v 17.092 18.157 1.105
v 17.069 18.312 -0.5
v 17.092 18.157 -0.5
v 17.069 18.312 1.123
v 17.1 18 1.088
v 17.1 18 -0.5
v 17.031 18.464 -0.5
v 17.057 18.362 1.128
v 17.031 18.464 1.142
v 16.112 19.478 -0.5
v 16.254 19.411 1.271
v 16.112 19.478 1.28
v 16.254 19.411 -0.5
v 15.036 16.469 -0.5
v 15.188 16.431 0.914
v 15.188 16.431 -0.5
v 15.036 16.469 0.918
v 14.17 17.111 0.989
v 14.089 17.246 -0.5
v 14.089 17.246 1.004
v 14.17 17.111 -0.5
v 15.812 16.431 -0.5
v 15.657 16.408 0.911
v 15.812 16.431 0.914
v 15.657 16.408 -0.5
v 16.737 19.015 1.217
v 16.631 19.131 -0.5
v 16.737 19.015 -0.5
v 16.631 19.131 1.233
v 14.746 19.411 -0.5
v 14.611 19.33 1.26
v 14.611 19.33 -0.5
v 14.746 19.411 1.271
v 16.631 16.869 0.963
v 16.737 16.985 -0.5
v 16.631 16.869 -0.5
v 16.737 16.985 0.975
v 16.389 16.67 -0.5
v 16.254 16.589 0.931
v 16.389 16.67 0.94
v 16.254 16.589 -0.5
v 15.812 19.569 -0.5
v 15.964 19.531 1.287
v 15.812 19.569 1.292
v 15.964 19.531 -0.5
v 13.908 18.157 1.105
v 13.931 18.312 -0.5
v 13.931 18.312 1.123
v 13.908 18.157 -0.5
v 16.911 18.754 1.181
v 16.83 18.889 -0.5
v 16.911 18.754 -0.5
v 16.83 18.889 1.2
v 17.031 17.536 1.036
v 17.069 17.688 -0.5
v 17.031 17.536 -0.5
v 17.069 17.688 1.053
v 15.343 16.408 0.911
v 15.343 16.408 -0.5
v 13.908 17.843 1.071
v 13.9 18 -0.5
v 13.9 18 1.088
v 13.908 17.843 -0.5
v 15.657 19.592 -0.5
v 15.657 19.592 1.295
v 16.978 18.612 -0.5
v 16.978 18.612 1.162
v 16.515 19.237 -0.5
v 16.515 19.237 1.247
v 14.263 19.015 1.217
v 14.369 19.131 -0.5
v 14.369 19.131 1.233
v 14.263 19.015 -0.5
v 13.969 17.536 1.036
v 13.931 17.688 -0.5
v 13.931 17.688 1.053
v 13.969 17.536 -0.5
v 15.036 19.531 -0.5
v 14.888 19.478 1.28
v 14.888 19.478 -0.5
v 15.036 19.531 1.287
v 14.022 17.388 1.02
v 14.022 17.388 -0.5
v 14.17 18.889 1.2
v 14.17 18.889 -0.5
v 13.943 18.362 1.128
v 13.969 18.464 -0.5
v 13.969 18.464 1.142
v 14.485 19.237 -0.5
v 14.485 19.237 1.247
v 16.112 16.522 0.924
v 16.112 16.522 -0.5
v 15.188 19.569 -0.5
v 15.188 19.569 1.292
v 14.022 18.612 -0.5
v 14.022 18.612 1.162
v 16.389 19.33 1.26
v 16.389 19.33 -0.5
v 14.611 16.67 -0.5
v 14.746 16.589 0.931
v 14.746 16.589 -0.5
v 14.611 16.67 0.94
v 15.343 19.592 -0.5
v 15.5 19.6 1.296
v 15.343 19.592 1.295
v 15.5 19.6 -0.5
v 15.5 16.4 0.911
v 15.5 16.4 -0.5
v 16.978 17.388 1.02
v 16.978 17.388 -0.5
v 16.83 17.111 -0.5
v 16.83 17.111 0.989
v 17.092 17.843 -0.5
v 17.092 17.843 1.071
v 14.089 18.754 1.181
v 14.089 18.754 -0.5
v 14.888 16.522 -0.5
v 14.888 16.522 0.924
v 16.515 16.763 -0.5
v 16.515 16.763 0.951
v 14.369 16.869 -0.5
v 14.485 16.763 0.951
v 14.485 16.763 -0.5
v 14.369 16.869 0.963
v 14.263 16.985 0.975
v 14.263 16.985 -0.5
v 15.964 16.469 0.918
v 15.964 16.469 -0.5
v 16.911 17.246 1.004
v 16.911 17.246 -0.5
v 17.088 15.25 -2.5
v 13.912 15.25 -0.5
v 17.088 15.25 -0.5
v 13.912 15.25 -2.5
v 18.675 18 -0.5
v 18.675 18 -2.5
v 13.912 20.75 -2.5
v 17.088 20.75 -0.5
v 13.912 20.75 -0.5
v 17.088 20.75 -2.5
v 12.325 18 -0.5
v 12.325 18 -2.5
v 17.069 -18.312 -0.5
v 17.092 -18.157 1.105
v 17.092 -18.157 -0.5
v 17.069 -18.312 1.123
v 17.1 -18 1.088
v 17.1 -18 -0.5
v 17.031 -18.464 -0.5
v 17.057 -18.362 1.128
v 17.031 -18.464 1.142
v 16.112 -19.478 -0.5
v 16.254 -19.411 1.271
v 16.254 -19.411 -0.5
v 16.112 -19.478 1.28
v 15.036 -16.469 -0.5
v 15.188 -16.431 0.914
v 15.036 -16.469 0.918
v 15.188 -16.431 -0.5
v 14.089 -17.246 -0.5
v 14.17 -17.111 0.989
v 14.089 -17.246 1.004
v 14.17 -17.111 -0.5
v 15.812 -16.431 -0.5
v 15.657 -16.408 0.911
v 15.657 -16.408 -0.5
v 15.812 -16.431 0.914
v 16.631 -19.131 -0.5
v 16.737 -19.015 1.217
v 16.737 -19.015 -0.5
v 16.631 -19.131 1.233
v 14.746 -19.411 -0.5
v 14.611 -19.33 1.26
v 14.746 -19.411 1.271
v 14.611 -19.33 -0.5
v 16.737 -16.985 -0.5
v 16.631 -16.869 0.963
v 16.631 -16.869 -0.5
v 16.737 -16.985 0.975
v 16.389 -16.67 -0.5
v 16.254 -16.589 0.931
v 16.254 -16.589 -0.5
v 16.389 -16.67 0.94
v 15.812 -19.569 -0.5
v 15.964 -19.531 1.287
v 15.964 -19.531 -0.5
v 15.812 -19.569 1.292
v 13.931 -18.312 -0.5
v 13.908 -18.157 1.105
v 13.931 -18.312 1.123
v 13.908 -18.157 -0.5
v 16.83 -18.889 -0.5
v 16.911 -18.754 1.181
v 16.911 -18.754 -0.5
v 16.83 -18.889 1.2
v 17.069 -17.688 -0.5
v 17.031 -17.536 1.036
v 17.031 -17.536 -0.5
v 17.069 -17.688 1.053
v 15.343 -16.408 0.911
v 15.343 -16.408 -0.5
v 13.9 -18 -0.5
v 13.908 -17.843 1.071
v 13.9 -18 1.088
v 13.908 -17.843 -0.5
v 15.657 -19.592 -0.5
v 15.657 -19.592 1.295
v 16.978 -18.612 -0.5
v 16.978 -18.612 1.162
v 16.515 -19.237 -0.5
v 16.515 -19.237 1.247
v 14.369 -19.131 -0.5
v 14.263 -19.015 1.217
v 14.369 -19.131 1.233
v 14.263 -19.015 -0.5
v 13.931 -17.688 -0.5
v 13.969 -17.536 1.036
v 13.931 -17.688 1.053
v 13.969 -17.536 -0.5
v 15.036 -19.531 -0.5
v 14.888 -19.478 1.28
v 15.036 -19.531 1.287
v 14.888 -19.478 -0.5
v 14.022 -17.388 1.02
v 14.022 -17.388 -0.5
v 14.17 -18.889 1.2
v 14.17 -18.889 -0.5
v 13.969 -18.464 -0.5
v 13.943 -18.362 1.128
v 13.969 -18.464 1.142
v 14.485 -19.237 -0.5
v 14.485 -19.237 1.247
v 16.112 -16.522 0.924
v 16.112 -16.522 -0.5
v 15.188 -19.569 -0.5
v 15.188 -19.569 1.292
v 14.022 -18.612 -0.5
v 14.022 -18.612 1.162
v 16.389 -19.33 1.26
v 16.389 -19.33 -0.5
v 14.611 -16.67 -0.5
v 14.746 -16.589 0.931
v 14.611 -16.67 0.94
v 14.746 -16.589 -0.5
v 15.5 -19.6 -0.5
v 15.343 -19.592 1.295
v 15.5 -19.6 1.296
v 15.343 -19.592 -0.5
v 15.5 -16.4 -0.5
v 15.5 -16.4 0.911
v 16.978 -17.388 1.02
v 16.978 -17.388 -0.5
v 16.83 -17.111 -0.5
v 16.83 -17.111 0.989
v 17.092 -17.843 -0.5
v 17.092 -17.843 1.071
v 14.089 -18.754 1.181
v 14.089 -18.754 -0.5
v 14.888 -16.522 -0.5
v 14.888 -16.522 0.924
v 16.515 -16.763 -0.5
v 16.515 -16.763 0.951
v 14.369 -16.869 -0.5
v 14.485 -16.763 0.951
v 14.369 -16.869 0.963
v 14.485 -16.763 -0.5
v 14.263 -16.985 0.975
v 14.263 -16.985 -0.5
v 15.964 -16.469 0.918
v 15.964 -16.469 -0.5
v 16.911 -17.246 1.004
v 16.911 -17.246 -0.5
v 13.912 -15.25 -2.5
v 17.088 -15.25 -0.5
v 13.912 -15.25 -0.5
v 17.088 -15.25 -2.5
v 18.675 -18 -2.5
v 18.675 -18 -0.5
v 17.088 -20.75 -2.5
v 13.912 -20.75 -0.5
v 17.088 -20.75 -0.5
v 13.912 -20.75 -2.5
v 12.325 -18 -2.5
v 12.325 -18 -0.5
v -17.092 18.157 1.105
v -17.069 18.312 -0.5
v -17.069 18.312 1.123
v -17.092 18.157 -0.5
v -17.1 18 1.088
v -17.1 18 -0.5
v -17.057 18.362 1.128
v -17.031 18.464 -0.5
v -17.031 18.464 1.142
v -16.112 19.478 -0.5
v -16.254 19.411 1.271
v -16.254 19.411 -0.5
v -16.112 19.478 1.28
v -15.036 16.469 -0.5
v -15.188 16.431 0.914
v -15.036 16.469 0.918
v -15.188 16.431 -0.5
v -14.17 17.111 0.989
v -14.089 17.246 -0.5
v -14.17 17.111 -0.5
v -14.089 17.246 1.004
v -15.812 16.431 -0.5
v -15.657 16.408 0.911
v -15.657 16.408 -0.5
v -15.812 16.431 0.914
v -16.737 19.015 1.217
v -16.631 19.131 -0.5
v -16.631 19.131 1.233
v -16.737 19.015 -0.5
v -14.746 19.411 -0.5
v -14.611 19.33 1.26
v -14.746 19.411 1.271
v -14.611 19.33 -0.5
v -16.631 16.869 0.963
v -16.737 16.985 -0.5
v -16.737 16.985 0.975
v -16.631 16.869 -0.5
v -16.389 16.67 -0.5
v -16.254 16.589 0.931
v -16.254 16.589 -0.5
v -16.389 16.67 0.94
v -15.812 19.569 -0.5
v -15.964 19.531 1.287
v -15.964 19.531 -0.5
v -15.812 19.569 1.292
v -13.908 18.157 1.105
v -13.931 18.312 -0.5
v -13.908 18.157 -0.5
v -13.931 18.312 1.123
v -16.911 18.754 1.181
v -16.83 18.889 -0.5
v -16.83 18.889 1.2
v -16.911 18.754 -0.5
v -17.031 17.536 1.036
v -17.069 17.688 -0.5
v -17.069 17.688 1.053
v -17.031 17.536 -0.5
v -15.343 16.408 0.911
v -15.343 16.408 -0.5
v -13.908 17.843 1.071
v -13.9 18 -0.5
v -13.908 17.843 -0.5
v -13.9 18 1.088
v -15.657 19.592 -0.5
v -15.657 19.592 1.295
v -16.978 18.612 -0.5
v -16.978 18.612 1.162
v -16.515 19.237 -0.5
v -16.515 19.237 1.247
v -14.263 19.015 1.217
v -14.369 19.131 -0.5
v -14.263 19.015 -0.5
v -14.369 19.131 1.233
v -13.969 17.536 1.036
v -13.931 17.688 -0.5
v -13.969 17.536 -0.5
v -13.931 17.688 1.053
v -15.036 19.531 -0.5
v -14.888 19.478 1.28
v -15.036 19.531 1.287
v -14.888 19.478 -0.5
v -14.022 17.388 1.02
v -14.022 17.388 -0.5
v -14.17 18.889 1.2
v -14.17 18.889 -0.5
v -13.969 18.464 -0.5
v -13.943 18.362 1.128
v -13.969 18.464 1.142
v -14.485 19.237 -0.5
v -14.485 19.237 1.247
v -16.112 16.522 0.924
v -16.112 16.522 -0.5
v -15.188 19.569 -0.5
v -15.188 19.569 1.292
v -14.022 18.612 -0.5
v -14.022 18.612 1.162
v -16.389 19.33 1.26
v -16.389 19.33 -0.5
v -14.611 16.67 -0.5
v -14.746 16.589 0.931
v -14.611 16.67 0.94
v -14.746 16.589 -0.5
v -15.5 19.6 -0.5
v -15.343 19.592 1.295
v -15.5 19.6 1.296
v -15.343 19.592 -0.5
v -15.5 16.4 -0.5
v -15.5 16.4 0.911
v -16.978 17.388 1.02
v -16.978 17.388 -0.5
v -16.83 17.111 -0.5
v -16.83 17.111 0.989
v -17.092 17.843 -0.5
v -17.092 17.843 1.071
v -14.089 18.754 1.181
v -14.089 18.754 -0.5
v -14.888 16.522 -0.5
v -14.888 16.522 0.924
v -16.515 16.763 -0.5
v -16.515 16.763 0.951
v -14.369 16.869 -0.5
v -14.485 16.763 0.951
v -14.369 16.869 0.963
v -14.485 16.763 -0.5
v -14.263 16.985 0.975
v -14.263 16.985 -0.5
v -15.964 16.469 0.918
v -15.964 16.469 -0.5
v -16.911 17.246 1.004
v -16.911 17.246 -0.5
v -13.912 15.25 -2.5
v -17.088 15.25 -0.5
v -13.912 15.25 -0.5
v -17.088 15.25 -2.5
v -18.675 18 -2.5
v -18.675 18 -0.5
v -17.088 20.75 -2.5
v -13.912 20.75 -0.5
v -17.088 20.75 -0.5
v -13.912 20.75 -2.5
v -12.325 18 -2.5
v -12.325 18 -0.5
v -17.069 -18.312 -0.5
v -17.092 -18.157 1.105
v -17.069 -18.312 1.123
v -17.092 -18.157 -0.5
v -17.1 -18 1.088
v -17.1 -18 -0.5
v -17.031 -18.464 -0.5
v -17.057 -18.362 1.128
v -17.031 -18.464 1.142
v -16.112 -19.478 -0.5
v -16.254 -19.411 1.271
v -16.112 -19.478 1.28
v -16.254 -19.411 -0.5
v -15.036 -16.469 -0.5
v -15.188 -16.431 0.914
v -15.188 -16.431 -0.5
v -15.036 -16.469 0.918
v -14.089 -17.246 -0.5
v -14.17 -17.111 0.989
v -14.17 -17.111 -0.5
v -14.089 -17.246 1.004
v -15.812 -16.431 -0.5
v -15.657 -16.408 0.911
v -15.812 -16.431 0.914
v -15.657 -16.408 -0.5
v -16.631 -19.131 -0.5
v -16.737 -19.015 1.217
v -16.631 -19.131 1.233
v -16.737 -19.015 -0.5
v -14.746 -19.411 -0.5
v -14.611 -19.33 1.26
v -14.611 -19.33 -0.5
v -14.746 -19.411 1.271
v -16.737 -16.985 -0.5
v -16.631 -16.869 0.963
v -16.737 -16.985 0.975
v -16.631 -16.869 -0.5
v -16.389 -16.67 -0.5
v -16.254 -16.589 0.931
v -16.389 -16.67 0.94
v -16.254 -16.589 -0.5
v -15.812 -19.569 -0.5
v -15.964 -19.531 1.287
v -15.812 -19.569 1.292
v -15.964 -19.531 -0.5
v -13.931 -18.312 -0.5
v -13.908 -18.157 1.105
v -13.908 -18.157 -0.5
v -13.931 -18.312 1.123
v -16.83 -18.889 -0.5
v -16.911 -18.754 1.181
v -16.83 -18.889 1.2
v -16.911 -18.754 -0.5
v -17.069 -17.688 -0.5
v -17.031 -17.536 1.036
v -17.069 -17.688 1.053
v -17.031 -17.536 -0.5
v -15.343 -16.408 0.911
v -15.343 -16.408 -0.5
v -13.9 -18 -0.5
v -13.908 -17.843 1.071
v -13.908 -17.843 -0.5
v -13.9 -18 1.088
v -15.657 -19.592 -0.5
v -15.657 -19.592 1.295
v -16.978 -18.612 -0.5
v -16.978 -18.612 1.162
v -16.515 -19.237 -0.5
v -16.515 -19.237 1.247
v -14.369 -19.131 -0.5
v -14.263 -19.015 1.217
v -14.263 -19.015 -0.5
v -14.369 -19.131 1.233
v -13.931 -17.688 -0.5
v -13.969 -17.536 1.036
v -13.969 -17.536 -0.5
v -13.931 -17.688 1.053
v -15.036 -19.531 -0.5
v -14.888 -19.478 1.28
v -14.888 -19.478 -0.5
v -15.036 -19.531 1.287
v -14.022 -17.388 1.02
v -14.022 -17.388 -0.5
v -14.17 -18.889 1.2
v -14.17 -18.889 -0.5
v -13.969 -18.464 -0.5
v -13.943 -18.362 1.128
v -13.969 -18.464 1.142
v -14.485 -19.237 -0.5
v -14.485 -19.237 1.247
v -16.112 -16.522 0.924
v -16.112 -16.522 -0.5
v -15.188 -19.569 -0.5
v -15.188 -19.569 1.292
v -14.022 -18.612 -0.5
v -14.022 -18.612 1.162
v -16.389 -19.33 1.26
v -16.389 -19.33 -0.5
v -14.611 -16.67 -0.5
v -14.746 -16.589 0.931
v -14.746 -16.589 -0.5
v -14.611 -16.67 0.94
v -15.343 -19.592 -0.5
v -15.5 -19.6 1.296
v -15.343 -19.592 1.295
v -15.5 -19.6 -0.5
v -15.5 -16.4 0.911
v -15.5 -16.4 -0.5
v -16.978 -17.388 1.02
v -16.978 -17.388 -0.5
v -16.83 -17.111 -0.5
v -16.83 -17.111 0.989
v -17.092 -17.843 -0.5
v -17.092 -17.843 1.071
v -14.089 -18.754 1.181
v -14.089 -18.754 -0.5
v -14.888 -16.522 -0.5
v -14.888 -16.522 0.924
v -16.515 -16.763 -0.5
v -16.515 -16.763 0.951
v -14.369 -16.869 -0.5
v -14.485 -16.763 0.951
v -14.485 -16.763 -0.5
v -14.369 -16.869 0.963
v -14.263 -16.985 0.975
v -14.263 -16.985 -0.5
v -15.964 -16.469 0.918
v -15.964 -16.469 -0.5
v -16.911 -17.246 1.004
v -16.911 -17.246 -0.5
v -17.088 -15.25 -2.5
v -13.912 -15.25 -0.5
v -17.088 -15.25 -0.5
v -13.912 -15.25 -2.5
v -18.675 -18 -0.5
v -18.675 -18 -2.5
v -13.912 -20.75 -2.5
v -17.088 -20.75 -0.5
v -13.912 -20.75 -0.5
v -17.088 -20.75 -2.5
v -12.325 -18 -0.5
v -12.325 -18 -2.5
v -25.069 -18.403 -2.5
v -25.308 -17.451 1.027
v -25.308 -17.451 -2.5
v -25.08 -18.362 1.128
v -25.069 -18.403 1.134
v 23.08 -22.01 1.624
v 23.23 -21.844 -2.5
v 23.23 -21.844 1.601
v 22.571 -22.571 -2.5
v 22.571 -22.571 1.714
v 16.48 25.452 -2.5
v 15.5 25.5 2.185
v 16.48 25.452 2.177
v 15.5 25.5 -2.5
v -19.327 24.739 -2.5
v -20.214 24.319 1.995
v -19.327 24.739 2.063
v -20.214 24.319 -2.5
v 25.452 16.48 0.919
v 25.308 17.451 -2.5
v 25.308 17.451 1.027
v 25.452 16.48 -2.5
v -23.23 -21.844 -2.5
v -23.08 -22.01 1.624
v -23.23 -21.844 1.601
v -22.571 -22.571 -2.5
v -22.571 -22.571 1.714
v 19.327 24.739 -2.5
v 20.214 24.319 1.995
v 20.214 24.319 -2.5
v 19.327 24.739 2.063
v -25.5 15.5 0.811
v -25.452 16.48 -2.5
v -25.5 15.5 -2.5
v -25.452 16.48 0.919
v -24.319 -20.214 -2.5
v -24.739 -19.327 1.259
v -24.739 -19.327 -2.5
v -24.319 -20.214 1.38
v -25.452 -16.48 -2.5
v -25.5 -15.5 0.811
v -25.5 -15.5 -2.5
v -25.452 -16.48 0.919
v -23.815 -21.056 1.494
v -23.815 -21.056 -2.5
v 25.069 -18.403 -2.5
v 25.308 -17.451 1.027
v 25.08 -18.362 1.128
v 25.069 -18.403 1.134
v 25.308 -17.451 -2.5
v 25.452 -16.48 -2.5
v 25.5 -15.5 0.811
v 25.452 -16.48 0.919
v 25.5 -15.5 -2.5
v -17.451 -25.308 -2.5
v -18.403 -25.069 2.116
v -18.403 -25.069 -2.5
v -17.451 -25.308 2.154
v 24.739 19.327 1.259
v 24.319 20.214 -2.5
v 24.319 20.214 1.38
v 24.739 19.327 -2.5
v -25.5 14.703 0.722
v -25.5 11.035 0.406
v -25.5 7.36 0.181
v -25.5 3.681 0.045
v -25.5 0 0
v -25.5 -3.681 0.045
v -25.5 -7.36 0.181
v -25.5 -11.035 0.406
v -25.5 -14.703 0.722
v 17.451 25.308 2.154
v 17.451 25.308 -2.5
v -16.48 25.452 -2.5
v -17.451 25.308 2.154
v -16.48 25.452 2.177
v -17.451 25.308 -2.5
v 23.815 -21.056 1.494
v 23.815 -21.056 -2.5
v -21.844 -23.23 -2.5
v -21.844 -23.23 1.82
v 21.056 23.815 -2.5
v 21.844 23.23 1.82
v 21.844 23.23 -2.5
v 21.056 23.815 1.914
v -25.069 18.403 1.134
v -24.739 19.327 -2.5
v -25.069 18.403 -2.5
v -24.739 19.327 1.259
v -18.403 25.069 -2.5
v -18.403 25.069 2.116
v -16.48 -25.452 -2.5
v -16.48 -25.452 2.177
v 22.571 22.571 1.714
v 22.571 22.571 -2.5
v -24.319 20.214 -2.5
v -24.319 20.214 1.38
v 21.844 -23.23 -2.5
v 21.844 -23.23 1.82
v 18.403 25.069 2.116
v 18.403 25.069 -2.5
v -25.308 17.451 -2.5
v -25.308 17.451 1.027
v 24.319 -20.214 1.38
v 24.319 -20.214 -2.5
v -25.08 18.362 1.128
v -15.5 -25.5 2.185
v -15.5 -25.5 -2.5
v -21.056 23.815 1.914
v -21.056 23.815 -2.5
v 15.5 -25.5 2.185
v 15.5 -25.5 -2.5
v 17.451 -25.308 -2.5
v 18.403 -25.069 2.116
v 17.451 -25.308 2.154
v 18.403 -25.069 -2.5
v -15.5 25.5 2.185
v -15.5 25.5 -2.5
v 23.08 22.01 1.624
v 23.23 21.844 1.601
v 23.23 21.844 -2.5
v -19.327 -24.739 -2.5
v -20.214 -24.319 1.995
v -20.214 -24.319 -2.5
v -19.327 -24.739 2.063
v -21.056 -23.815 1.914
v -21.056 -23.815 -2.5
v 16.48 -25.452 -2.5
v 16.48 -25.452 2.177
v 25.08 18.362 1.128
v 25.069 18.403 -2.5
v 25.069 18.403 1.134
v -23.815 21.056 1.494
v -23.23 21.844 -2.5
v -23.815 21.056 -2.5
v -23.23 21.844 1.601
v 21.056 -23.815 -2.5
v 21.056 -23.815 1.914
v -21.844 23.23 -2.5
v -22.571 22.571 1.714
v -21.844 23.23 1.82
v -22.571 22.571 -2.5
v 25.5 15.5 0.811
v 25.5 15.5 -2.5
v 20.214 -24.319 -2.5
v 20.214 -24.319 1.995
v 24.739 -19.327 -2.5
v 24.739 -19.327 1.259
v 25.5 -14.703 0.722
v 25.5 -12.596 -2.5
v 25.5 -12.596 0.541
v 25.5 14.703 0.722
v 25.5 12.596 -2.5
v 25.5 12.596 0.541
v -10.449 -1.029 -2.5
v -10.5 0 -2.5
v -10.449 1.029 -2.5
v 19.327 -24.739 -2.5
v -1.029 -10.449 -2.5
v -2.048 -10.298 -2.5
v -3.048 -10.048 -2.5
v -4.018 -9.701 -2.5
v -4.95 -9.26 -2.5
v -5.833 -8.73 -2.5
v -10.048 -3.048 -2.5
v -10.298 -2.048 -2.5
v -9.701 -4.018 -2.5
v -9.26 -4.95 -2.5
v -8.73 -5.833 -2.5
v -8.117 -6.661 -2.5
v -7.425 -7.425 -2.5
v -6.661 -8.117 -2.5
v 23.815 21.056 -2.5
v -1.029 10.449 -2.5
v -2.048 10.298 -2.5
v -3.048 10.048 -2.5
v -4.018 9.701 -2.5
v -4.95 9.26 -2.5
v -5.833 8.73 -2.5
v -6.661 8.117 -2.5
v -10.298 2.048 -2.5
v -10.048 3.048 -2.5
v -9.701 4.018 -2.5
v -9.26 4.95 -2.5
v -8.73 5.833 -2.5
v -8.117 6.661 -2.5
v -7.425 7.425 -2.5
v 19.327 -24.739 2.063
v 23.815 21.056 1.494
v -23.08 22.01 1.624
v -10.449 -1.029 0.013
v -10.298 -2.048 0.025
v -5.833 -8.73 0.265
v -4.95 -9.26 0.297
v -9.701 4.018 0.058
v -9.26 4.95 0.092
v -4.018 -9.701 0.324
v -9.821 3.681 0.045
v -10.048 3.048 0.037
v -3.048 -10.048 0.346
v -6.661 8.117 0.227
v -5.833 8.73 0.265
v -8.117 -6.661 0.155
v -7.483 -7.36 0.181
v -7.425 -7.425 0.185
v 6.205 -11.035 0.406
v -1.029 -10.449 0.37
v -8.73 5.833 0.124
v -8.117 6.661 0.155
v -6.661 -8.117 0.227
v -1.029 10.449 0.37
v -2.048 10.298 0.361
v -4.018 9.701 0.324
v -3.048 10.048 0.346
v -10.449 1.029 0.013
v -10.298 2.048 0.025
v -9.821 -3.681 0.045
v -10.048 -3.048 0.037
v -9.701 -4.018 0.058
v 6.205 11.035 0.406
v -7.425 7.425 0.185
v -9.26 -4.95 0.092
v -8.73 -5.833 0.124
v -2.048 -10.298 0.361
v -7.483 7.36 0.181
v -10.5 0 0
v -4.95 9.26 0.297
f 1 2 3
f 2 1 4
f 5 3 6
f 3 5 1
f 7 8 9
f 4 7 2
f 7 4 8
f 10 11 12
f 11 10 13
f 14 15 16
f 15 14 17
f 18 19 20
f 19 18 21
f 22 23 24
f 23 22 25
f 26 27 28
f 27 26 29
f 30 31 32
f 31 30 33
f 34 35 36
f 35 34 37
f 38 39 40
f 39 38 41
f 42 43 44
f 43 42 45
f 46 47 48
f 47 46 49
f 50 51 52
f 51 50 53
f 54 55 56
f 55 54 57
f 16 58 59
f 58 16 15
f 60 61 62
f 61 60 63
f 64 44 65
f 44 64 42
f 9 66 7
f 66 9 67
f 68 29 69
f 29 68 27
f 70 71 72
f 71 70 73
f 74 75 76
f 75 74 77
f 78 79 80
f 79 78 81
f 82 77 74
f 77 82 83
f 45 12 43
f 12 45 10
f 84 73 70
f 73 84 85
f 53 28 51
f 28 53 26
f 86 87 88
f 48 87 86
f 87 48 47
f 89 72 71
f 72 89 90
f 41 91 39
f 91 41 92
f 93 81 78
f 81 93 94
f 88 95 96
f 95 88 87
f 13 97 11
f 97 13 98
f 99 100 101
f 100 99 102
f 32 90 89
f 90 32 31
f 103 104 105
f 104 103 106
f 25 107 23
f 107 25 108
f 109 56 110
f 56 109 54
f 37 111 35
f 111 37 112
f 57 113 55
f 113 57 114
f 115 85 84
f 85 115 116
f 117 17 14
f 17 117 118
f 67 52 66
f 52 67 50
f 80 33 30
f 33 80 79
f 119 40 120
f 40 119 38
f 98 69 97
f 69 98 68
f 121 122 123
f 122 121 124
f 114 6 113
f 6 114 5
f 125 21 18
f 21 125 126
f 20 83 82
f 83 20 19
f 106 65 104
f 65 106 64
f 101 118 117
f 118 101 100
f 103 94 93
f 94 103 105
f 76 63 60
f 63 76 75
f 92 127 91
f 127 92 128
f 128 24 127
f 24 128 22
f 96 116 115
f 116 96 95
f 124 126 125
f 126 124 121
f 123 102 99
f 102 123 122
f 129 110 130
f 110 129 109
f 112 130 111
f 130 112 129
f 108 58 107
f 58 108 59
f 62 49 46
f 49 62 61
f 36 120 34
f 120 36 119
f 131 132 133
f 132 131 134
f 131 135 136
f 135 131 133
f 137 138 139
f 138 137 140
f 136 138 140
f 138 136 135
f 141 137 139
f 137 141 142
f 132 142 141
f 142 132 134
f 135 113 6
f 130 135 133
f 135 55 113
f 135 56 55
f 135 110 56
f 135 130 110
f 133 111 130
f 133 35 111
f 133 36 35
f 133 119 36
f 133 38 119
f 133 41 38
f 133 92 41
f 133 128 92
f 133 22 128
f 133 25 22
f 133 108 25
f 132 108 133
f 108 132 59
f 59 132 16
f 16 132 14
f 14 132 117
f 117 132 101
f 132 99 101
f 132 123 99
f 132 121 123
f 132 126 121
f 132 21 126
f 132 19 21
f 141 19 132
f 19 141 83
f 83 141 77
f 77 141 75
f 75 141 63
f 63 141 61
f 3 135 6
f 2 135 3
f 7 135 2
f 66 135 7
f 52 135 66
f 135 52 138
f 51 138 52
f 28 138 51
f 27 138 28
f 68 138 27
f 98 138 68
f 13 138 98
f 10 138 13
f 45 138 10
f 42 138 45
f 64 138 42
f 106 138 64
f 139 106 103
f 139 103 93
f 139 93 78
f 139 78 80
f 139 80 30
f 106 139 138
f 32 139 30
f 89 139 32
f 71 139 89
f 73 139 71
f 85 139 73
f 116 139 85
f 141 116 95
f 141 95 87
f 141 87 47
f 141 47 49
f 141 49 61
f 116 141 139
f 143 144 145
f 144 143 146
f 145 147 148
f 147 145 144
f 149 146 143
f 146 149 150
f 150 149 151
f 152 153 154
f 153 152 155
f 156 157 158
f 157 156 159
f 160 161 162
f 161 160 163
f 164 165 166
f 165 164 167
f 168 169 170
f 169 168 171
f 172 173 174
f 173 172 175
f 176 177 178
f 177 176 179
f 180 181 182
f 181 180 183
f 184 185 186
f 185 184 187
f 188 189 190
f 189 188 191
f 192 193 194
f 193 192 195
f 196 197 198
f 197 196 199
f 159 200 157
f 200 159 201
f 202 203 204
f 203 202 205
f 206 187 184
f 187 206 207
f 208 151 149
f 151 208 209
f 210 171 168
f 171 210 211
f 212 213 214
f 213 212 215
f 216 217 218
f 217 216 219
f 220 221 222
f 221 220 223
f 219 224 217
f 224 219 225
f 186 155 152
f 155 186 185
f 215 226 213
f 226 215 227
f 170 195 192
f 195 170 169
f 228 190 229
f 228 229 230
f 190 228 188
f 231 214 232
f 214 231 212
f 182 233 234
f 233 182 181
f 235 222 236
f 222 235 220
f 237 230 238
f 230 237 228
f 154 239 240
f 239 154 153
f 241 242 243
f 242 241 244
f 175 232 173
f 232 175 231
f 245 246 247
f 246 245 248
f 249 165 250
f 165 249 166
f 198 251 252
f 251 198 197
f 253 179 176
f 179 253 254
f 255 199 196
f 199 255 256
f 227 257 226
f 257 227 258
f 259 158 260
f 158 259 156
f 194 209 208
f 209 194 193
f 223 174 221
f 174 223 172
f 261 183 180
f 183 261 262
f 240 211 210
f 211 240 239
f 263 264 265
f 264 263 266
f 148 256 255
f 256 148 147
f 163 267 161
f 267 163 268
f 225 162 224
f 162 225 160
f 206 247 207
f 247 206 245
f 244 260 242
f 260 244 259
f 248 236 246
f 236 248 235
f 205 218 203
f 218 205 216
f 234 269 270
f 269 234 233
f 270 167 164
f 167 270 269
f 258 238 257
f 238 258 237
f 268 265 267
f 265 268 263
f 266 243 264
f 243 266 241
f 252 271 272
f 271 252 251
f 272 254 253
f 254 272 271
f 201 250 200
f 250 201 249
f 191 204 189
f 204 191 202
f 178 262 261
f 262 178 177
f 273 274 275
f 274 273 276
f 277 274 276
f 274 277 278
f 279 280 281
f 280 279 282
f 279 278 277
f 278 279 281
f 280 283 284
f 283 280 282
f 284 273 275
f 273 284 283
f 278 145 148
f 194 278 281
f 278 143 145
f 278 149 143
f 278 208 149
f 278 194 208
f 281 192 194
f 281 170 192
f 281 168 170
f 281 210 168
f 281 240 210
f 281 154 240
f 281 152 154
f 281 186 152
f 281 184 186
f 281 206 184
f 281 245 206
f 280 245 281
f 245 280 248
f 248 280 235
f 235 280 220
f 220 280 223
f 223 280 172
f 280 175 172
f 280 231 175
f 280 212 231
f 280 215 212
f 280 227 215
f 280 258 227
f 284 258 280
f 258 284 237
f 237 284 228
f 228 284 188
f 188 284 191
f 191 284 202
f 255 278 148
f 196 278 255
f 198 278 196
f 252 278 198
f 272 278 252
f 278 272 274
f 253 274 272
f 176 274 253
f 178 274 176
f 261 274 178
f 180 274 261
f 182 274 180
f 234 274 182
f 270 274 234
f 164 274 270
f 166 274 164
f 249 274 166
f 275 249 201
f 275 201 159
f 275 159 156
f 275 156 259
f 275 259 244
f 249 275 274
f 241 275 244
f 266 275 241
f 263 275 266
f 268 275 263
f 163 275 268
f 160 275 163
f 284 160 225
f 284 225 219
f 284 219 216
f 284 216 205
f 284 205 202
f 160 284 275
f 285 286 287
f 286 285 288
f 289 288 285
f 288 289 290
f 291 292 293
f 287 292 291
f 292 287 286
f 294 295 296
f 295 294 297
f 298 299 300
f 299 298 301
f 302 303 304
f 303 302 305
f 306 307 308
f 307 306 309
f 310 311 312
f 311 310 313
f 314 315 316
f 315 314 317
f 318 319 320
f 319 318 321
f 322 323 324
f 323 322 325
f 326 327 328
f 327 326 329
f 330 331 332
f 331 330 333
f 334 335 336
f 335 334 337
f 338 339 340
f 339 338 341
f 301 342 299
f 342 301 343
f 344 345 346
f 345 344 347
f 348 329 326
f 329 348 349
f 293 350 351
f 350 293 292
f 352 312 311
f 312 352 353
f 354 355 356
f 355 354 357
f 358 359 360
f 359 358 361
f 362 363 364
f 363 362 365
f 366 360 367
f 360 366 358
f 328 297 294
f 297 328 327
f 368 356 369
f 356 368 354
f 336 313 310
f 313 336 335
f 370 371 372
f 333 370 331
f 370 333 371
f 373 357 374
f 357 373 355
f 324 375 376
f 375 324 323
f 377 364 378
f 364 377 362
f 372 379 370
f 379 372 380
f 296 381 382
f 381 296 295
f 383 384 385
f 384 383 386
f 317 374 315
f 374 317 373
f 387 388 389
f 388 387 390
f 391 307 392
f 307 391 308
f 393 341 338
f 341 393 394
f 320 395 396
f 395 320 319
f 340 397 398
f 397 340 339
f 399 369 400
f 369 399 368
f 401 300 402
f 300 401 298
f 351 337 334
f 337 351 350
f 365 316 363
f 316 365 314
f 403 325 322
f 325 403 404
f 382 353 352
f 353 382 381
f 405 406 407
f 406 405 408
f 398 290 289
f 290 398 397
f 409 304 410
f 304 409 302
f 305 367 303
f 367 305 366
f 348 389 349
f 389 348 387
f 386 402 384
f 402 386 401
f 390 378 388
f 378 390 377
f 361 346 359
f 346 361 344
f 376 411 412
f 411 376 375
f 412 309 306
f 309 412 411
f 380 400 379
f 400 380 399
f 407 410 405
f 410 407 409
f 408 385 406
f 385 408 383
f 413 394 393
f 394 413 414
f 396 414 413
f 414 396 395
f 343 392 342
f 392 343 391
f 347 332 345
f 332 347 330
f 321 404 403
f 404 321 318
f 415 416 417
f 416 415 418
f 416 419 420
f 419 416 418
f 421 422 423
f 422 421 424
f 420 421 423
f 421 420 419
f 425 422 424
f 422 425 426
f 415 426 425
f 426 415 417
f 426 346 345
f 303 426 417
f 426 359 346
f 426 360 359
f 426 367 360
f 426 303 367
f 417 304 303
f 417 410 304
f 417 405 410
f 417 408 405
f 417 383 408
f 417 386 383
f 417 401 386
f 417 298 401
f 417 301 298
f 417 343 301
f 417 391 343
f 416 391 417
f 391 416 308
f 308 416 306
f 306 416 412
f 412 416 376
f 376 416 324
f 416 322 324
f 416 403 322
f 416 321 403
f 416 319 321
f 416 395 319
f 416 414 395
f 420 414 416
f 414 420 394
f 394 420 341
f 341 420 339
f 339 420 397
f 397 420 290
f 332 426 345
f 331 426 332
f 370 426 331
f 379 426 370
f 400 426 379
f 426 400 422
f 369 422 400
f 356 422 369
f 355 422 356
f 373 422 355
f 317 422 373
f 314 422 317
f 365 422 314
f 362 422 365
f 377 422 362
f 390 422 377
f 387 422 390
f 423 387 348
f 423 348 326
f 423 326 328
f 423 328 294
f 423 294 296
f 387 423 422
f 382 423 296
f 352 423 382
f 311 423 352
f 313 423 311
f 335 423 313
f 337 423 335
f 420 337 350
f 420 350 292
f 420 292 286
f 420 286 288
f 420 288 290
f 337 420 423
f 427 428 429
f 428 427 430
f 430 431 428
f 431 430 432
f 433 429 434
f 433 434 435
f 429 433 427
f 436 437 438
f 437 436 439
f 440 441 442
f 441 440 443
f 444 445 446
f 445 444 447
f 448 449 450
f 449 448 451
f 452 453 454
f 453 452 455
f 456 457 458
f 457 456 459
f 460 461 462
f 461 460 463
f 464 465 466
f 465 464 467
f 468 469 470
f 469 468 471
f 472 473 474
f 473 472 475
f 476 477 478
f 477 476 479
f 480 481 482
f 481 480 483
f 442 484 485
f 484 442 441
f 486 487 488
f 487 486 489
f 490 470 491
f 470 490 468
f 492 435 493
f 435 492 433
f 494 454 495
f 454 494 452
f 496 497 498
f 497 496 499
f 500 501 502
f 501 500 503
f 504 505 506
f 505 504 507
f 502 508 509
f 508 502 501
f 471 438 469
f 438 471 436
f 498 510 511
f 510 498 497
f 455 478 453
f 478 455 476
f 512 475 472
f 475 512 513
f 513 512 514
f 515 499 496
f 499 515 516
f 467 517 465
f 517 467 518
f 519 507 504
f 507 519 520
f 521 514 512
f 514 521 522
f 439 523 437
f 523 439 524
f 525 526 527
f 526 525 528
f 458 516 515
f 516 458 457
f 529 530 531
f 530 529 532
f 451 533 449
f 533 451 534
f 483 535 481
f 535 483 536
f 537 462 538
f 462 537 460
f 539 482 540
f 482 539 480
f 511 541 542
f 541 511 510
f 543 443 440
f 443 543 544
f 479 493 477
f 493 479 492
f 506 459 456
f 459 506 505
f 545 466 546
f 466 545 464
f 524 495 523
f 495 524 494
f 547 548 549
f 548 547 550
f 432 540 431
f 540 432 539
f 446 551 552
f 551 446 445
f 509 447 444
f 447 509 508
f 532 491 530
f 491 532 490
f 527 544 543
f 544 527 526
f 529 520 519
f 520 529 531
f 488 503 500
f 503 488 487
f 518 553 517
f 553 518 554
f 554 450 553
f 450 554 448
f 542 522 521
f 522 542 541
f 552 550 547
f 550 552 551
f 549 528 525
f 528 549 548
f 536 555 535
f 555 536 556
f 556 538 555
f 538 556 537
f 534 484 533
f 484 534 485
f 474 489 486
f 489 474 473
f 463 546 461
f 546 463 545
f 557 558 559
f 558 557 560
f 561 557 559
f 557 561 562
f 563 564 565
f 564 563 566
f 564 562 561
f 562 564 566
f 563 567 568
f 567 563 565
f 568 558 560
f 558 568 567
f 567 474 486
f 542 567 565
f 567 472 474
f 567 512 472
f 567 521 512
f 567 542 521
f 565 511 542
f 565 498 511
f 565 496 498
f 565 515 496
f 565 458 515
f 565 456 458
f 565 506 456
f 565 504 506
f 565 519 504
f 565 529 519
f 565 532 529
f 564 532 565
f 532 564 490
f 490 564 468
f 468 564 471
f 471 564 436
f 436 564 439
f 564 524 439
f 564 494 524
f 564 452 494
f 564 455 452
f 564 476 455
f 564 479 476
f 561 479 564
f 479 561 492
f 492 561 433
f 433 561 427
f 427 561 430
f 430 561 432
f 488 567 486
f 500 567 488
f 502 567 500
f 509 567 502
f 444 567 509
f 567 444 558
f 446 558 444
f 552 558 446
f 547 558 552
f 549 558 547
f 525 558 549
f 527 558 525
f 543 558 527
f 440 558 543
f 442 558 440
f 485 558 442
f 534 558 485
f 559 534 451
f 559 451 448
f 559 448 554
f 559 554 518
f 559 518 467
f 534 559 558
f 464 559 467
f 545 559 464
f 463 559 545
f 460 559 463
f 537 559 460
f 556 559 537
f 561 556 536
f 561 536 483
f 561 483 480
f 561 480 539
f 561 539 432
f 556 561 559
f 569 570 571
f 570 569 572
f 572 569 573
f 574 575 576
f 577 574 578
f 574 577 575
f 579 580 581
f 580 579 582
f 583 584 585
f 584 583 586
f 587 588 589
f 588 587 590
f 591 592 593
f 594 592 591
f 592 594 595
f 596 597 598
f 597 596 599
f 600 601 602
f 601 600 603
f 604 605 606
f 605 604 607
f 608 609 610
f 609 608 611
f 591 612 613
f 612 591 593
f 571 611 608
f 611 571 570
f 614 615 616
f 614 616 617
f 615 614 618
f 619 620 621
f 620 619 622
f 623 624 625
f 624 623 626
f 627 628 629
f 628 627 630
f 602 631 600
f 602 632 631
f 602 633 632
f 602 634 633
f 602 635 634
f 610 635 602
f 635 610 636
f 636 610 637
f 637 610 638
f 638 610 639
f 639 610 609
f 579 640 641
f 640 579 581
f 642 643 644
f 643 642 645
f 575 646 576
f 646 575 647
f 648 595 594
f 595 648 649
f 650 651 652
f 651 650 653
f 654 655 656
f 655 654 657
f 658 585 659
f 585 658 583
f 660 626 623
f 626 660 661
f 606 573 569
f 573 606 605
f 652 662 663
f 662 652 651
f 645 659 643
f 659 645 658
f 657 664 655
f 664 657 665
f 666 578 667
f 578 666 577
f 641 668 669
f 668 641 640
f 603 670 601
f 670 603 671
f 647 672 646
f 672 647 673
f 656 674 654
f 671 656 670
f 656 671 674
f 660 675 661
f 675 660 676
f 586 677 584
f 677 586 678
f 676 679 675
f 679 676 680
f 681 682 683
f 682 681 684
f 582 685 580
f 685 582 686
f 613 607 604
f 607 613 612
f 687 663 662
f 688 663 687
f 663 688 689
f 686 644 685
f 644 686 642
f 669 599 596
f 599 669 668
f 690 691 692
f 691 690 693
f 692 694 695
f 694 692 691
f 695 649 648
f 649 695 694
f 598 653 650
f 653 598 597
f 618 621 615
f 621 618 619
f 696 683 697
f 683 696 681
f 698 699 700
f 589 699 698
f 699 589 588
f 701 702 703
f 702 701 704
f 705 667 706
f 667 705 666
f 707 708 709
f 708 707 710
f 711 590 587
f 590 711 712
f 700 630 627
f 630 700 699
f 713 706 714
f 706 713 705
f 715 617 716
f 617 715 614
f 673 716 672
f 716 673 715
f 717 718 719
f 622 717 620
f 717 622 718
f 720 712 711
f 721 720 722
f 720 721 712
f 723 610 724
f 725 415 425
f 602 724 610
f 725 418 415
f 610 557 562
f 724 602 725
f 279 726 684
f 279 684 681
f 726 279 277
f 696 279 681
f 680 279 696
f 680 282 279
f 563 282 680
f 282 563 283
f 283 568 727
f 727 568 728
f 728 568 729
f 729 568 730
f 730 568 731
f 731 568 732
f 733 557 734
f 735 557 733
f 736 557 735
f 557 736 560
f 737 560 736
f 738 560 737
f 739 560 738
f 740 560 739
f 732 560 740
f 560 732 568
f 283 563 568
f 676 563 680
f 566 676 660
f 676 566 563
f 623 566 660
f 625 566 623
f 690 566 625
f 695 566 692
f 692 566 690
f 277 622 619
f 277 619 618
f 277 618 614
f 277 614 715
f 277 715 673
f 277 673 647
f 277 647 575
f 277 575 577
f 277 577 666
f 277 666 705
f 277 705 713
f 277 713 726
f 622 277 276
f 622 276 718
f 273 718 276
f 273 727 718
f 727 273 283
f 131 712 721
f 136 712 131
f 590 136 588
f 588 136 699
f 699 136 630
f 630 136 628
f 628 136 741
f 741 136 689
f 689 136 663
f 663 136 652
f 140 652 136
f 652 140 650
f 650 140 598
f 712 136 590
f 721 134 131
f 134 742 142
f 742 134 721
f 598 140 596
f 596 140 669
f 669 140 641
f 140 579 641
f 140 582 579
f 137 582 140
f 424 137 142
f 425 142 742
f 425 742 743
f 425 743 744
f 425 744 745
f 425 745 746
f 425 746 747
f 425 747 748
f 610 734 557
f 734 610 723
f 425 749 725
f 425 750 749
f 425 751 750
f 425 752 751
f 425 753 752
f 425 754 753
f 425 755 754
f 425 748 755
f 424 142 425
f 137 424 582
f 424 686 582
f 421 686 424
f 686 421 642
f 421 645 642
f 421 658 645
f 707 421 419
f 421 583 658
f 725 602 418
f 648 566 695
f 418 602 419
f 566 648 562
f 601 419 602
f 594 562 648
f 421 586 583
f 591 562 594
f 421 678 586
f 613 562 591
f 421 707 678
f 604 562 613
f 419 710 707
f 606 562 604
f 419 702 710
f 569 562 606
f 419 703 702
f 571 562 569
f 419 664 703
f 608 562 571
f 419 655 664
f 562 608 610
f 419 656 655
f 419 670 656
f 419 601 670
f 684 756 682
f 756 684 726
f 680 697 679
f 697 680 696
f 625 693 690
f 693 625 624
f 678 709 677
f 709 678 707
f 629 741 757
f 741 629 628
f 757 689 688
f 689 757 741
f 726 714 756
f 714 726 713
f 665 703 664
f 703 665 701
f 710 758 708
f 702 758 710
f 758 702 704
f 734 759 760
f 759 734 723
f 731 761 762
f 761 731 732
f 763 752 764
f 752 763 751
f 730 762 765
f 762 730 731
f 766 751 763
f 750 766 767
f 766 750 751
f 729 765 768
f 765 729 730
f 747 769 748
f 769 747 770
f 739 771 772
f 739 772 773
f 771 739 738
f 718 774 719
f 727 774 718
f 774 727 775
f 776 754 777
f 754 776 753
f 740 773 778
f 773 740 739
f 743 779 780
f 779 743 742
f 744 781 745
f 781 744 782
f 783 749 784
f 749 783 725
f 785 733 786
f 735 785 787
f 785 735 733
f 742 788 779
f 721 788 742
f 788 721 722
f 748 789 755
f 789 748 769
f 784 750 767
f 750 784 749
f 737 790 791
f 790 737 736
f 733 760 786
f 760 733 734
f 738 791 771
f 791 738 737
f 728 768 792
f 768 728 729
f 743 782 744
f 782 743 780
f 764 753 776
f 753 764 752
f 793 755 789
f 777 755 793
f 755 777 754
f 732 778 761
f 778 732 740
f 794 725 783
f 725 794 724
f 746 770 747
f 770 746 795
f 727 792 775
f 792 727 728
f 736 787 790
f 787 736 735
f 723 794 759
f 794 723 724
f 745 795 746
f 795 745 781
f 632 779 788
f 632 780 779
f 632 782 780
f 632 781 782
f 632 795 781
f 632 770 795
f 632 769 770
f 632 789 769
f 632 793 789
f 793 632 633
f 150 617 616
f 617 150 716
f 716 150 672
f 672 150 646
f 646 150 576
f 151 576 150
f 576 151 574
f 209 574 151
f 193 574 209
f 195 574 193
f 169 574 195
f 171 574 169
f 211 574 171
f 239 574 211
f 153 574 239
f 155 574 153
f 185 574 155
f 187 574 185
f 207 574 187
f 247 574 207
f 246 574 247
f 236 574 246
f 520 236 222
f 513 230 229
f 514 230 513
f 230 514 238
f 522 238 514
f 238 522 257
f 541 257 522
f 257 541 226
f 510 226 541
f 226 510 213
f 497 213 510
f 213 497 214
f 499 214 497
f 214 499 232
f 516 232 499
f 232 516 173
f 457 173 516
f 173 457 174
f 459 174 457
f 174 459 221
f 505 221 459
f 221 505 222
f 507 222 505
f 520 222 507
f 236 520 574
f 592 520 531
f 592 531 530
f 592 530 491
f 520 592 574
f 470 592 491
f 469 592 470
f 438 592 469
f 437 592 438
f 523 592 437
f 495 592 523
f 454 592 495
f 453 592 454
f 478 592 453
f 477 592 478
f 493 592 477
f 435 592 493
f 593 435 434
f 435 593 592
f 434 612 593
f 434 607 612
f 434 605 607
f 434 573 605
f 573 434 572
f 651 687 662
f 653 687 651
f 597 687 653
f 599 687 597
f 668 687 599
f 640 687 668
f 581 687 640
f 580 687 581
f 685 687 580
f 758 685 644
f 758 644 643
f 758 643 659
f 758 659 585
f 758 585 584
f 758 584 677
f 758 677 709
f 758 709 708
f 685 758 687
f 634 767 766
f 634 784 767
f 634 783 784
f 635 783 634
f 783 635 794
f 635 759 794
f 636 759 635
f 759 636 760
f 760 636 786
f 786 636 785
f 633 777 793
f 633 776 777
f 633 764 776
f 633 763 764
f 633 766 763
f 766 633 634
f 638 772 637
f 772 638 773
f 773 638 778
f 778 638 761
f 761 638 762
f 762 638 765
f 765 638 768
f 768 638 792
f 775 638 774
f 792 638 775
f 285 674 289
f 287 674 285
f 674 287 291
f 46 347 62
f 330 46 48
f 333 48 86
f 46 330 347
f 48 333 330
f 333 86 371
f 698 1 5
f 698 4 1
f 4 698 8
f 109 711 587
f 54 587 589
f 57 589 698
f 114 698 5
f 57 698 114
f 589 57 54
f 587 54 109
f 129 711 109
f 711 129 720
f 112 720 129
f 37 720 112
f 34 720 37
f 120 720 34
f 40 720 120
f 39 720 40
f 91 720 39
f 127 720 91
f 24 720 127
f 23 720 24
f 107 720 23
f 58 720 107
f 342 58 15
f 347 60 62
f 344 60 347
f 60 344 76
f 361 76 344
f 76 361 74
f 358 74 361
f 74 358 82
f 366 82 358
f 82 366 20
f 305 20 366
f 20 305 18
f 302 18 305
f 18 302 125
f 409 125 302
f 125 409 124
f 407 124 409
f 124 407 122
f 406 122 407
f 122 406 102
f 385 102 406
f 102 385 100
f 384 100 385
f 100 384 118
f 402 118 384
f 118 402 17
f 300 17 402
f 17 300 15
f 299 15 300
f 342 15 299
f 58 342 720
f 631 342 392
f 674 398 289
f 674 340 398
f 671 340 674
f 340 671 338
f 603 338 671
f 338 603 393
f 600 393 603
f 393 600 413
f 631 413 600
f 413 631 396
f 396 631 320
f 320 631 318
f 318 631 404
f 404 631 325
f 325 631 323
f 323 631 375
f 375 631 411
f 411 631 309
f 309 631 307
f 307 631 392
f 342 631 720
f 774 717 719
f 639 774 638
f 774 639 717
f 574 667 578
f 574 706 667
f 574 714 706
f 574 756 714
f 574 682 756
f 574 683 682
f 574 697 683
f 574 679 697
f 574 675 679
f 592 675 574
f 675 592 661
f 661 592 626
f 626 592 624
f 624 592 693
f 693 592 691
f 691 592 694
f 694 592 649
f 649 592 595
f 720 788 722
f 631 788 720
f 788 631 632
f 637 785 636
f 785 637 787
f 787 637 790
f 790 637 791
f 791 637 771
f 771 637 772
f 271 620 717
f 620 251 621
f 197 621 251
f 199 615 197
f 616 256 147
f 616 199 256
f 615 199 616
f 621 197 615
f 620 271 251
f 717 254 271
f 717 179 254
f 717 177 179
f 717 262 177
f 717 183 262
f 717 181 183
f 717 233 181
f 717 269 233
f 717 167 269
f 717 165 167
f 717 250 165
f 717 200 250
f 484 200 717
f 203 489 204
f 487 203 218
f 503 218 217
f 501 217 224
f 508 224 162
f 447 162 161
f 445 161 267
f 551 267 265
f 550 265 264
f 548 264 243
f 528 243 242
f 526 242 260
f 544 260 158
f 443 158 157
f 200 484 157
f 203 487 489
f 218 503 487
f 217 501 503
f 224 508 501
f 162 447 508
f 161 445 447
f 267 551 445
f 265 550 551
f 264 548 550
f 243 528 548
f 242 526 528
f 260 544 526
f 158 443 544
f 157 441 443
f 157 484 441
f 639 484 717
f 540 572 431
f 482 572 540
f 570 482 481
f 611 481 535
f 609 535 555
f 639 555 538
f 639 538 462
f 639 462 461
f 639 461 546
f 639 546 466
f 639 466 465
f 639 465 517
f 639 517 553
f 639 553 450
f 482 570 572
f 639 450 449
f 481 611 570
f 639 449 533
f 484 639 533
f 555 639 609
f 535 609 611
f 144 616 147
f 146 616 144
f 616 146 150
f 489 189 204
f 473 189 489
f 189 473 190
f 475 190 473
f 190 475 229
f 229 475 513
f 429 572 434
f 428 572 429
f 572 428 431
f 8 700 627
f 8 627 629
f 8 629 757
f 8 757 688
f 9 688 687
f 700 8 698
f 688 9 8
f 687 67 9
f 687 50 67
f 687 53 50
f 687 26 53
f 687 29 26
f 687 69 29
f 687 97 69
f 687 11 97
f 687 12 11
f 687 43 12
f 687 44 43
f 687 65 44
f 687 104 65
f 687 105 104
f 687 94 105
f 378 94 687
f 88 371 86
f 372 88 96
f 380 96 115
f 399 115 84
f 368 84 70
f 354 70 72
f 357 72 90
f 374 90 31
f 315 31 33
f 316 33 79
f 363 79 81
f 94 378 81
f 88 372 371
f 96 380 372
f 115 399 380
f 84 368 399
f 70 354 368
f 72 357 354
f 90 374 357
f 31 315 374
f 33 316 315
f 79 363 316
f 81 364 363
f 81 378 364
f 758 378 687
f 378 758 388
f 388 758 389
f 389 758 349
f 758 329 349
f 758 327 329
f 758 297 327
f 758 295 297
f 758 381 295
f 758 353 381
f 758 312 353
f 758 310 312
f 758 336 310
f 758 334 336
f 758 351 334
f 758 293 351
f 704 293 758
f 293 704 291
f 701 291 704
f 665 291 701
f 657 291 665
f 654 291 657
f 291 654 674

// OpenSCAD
// file: syms.scad
module symY(t) {
    translate(t)
        children();
    mirror([0,1,0])
        translate(t)
            children();
}
module symX(t) {
    translate(t)
        children();
    mirror([1,0,0])
        translate(t)
            children();
}

module symZ(t) {
    translate(t)
        children();
    mirror([0,0,1])
        translate(t)
            children();
}

module	symXY(t) {
	tx=t[0];
	ty=t[1];
	tz=t[2];
	symX([tx,0,0])
	symY([0,ty,tz])
		children();
}
// main file
use <syms.scad>;

E_R=150;
D_C=21;
X=D_C/2+5;
Y=D_C/2+5;
H=5;

module atCorners() {
    for(x=[-X,X])
    for(y=[-Y,Y])
    translate([x,y,0])
        children();
}
$fn=64;

difference() {
    hull()
    atCorners()
        cylinder(r=10,h=H,center=true);
    
    hull() {
        cylinder(d=D_C,h=2*H,center=true);
        translate([2*X,0,0])
        cylinder(d=D_C+5,h=2*H,center=true);
    }
    
    symX([X,0,0])
    symY([0,Y+5/2,0]) {
        cylinder(d=3.2,h=2*H,center=true);
        translate([0,0,-H/2])
        cylinder($fn=6,d=5.5/cos(30),h=2*2,center=true);
        //translate([0,0,-H/2])        cube(5.5,center=true);
    }



// wall element    
translate([0,0,E_R])
rotate(90,[0,1,0])
cylinder(r=E_R,h=4*X,center=true,$fn=256);
    
}
